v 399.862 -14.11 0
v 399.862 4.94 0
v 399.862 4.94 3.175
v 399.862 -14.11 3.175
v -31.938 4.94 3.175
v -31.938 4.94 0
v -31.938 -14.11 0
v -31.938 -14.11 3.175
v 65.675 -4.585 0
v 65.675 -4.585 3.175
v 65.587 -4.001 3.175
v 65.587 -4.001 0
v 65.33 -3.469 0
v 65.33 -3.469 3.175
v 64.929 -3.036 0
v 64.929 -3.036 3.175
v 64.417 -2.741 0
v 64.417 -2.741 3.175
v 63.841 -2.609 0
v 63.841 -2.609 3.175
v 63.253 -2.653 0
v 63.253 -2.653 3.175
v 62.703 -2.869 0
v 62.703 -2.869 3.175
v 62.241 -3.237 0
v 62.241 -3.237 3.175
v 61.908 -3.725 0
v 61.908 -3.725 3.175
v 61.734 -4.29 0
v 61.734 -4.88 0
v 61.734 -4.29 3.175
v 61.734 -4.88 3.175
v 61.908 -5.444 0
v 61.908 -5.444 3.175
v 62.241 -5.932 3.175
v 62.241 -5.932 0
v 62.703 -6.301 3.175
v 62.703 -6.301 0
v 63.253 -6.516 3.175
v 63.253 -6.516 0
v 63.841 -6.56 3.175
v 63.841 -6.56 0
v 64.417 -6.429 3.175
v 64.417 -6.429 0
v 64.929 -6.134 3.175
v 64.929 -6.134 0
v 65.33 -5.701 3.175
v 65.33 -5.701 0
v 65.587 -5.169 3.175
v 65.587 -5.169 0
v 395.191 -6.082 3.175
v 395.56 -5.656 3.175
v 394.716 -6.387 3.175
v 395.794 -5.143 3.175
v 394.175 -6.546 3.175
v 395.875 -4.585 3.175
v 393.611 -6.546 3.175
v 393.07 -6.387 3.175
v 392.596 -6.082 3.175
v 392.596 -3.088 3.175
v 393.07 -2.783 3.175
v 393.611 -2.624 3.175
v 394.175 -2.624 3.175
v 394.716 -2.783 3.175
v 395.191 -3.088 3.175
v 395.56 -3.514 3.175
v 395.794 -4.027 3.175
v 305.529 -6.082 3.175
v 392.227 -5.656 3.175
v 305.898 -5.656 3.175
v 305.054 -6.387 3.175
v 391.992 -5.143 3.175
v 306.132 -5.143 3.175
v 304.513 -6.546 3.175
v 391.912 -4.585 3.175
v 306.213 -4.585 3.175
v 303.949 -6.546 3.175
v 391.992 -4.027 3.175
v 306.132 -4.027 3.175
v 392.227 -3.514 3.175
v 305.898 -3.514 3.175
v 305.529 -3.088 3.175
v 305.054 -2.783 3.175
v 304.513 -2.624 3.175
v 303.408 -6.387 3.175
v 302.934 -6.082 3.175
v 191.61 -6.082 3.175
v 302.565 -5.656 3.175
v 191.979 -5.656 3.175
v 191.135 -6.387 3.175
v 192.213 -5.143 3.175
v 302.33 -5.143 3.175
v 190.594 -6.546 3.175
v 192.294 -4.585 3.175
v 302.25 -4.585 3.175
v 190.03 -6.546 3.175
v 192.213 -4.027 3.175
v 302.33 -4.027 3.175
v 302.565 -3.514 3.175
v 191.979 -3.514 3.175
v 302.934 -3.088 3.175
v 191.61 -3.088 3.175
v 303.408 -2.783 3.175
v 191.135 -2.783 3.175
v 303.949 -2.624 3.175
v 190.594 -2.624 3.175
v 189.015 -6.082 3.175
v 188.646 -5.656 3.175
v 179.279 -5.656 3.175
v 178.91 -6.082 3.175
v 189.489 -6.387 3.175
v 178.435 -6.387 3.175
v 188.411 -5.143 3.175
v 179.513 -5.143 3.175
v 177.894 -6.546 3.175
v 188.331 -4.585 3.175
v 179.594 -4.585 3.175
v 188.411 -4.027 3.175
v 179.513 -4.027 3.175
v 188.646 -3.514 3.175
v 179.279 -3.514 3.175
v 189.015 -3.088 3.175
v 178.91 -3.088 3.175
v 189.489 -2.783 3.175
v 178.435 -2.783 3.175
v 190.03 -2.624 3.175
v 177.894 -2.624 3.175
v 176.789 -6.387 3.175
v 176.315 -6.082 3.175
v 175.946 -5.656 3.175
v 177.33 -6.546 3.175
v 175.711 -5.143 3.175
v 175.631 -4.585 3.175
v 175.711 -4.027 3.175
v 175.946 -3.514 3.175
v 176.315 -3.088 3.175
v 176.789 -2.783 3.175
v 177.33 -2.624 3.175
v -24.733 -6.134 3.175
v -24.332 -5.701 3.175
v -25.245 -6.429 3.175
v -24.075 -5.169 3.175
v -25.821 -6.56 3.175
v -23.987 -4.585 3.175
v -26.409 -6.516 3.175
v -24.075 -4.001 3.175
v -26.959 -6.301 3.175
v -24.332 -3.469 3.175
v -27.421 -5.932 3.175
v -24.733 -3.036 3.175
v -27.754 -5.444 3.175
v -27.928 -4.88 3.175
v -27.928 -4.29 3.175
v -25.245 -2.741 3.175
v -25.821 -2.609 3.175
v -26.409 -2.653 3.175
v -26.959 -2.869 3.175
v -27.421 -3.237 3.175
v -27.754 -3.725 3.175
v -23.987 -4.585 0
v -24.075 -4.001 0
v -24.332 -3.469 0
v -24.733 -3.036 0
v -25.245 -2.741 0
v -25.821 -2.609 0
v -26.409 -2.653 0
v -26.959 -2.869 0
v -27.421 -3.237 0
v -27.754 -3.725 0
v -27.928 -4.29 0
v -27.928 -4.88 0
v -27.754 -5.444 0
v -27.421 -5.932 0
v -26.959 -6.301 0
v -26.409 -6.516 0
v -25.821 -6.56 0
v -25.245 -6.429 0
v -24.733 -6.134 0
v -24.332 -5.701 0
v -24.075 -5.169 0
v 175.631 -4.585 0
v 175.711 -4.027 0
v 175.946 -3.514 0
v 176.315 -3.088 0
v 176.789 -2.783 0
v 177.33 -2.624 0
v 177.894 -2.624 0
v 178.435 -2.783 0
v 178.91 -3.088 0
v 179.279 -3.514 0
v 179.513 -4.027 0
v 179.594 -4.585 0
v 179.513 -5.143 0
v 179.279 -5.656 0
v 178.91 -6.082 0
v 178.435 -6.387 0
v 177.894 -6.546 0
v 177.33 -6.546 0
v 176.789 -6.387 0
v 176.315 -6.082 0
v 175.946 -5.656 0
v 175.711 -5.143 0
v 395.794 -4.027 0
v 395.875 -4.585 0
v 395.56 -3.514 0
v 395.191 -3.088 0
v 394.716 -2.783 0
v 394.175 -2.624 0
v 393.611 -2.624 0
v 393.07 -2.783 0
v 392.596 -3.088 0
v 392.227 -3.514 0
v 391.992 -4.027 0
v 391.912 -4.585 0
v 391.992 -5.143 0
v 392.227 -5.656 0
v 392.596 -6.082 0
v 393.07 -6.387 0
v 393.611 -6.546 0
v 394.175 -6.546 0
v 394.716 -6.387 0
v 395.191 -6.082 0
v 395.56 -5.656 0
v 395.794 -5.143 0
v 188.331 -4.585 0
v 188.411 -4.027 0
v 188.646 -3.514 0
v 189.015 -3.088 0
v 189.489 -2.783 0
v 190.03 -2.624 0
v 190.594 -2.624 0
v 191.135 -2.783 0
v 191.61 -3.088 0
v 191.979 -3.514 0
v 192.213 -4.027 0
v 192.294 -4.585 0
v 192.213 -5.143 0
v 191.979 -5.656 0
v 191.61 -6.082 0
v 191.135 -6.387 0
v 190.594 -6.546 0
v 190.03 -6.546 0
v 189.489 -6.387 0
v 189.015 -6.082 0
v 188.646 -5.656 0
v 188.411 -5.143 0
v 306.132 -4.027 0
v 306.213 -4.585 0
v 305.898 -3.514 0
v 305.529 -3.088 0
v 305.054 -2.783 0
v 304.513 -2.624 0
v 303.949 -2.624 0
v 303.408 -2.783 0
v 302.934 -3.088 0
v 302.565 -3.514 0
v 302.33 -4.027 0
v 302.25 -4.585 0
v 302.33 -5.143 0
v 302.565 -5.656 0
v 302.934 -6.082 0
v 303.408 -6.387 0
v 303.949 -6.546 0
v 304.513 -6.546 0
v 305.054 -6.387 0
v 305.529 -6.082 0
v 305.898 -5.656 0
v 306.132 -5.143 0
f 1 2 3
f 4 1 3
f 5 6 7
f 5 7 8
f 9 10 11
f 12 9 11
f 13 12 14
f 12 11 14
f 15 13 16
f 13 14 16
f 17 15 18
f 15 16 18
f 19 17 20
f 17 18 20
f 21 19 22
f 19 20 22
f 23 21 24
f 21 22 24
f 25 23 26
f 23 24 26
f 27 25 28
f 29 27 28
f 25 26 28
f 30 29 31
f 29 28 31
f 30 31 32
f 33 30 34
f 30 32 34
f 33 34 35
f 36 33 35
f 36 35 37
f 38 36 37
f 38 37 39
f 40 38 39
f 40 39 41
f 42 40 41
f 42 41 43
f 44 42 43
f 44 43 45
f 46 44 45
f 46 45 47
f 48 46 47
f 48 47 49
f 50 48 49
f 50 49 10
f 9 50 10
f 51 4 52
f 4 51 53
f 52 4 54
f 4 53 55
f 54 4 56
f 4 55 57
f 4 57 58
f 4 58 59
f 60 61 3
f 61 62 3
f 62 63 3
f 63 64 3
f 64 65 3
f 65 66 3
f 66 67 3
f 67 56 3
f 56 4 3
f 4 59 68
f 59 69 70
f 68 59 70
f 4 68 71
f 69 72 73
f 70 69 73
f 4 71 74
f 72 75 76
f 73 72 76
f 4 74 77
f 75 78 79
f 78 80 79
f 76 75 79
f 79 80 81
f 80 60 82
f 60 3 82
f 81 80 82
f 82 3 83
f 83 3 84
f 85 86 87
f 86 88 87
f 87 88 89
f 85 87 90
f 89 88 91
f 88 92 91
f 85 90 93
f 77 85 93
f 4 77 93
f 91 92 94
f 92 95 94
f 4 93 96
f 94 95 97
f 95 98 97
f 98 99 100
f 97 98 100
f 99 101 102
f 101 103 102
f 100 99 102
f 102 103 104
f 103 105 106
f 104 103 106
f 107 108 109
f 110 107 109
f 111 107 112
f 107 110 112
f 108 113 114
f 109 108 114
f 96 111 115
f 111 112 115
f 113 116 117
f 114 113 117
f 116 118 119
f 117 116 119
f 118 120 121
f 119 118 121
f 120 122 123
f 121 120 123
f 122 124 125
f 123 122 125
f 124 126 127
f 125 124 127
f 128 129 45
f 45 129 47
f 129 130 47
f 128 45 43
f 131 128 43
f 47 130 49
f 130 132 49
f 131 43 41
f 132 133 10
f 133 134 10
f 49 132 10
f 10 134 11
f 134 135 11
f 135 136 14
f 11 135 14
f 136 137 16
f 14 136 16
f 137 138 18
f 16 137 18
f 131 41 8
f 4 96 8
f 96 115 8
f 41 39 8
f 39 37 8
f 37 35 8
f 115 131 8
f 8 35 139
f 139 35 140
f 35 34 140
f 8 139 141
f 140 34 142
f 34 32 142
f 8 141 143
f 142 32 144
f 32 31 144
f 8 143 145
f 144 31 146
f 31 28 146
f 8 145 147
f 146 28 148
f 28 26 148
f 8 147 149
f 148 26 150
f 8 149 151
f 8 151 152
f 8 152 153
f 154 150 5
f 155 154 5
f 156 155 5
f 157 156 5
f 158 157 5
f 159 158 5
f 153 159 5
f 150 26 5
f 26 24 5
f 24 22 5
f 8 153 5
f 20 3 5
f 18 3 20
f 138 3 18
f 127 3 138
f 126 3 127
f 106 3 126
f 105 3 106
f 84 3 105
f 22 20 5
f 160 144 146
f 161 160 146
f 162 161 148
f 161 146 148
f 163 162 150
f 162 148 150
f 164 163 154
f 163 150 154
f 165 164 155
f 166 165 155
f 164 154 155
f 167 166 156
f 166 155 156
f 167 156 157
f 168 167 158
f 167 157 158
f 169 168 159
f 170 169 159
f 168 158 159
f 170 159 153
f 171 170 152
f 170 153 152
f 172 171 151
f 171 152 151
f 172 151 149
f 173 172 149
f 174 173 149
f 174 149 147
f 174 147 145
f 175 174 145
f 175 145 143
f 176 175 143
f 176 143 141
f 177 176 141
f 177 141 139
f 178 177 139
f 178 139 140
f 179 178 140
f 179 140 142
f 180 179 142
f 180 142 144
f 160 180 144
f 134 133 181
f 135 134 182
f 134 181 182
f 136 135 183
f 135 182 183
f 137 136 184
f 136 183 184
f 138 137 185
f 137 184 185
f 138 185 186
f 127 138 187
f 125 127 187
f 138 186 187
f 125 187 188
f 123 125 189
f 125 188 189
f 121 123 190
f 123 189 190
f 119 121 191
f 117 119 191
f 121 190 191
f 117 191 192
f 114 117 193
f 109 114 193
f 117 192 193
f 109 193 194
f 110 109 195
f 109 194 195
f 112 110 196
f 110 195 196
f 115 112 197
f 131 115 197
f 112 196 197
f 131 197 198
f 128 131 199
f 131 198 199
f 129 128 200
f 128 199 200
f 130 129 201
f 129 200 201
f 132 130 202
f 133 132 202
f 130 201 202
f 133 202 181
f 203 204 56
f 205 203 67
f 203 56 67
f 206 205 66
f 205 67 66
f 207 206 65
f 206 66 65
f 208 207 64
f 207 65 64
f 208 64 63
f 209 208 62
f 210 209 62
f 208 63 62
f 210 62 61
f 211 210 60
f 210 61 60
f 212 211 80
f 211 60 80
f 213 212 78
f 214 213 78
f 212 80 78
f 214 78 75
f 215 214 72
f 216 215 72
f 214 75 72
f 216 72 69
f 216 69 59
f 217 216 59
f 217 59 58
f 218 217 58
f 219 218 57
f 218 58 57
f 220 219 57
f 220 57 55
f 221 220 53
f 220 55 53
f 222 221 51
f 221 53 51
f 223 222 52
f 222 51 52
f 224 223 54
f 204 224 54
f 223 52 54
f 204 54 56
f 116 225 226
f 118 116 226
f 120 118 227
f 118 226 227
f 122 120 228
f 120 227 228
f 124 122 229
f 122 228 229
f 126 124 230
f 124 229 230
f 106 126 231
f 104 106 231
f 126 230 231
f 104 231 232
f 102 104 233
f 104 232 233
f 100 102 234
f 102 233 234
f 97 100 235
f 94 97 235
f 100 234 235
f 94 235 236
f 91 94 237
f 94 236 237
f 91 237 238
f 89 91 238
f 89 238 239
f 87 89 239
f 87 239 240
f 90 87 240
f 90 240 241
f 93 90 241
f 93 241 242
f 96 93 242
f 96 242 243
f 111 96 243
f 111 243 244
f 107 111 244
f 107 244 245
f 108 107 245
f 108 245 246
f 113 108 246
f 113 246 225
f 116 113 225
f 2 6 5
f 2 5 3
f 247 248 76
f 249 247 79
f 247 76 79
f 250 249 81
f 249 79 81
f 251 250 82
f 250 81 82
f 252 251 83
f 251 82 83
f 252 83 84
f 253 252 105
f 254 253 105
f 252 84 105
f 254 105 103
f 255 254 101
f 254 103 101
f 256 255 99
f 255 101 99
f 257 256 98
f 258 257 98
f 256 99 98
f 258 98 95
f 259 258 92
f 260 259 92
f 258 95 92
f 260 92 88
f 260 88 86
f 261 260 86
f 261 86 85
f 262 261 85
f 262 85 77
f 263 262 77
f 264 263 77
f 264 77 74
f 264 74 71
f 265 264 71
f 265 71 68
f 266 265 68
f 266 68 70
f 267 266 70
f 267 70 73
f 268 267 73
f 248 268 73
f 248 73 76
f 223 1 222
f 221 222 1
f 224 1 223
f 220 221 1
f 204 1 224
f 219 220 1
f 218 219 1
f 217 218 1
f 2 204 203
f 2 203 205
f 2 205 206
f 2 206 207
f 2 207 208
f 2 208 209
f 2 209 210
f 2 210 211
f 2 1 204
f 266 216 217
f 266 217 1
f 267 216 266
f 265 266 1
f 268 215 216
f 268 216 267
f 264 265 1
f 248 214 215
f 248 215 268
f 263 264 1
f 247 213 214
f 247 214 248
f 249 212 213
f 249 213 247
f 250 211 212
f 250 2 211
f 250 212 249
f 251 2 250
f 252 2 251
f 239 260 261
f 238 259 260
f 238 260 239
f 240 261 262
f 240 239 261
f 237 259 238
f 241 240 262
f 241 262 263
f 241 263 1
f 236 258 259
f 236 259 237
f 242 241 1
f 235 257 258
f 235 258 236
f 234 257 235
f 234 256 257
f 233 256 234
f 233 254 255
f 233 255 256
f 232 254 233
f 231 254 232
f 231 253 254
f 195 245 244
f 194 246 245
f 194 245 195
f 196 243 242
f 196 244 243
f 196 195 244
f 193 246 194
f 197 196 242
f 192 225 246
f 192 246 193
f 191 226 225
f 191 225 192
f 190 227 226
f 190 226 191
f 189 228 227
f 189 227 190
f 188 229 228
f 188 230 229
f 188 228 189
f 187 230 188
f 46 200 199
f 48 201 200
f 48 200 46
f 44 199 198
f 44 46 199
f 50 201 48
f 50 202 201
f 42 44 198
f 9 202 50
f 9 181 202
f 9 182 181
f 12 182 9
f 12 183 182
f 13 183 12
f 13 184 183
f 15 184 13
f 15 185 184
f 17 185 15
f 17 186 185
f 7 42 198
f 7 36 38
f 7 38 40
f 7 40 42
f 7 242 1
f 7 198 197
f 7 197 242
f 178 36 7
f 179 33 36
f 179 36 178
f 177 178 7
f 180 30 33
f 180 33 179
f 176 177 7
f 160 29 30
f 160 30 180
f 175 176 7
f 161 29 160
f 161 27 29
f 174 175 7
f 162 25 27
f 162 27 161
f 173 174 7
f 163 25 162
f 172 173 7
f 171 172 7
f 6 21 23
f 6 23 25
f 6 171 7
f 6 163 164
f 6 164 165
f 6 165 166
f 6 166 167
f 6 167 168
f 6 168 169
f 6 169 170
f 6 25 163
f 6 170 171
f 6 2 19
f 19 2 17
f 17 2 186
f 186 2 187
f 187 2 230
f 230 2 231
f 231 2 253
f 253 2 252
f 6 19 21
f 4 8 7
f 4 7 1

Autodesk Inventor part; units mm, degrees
ref_plane "YZ Plane" through (0, 0, 0) normal (1, 0, 0) x (0, 1, 0)
ref_plane "XZ Plane" through (0, 0, 0) normal (0, 1, 0) x (-1, 0, 0)
ref_plane "XY Plane" through (0, 0, 0) normal (0, 0, 1) x (1, 0, 0)
sketch "Sketch1" plane through (0, 0, 0) normal (0, 0, 1) x (1, 0, 0)
  line L0 (-31.9376, 1.7652) -> (399.8624, 1.7652)
  line L1 (399.8624, 1.7652) -> (399.8624, -10.9348)
  line L2 (399.8624, -10.9348) -> (-31.9376, -10.9348)
  line L3 (-31.9376, -10.9348) -> (-31.9376, 1.7652)
  line L4 (183.9624, -4.5848) -> (-26.4766, -4.5848)
  line L5 (-26.4766, -4.5848) -> (394.4014, -4.5848)
  circle A0 centre (-26.4766, -4.5848) radius 1.9812
  circle A1 centre (394.4014, -4.5848) radius 1.9812
  point P0 (0, 0)
  dimension "d0" = 431.8
  dimension "d1" = 12.7
  dimension "d2" = 210.439
  dimension "d3" = 420.878
  dimension "d4" = 3.9624
  dimension "d5" = 3.9624
extrude "Extrusion1" add sketch "Sketch1" along normal blind 3.175
sketch "Sketch2" plane through (-31.9376, 1.7652, 0) normal (0, 1, 0) x (1, 0, 0)
  line L0 (0, -3.175) -> (431.8, -3.175) projected
  line L1 (431.8, 0) -> (431.8, -3.175) projected
  line L2 (0, 0) -> (431.8, 0) projected
  line L3 (0, 0) -> (0, -3.175) projected
  point P0 (31.9376, 0)
extrude "Extrusion2" add sketch "Sketch2" along normal blind 3.175
sketch "Sketch3" plane through (-31.9376, -10.9348, 0) normal (0, -1, 0) x (1, 0, 0)
  line L0 (431.8, 3.175) -> (0, 3.175) projected
  line L1 (0, 0) -> (0, 3.175) projected
  line L2 (431.8, 0) -> (0, 0) projected
  line L3 (431.8, 0) -> (431.8, 3.175) projected
  point P0 (31.9376, 0)
extrude "Extrusion3" add sketch "Sketch3" along normal blind 3.175
sketch "Sketch4" plane through (0, 0, 3.175) normal (0, 0, 1) x (1, 0, 0)
  circle A0 centre (394.4014, -4.5848) radius 1.9812 projected
  circle A1 centre (-26.4766, -4.5848) radius 1.9812 projected
  line L0 (-31.9376, -14.1098) -> (399.8624, -14.1098) projected
  line L1 (394.4014, -4.5848) -> (298.7704, -4.5848)
  line L2 (-26.4766, -4.5848) -> (69.1544, -4.5848)
  circle A2 centre (69.1544, -4.5848) radius 1.9812
  circle A3 centre (298.7704, -4.5848) radius 1.9812
  point P0 (0, 0)
  dimension "d12" = 95.631
  dimension "d13" = 95.631
extrude "Extrusion4" cut sketch "Sketch4" against normal blind 25.4 contours A3 | A2
sketch "Sketch5" plane through (0, 0, 0) normal (0, 0, -1) x (-1, 0, 0)
  circle A0 centre (-298.7704, -4.5848) radius 1.9812 projected
  point P0 (0, 0)
extrude "Extrusion5" add sketch "Sketch5" against normal blind 3.175
sketch "Sketch6" plane through (0, 0, 0) normal (0, 0, -1) x (-1, 0, 0)
  circle A0 centre (-69.1544, -4.5848) radius 1.9812 projected
  point P0 (0, 0)
extrude "Extrusion6" add sketch "Sketch6" against normal blind 3.175
sketch "Sketch7" plane through (0, 0, 0) normal (0, 0, -1) x (-1, 0, 0)
  circle A0 centre (-394.4014, -4.5848) radius 1.9812 projected
  circle A1 centre (26.4766, -4.5848) radius 1.9812 projected
  line L0 (31.9376, 4.9402) -> (-399.8624, 4.9402) projected
  line L1 (26.4766, -4.5848) -> (-63.1854, -4.5848)
  line L2 (-394.4014, -4.5848) -> (-304.7394, -4.5848)
  circle A2 centre (-304.7394, -4.5848) radius 1.9812
  circle A3 centre (-63.1854, -4.5848) radius 1.9812
  point P0 (0, 0)
  dimension "d20" = 89.662
  dimension "d21" = 89.662
extrude "Extrusion7" cut sketch "Sketch7" against normal blind 3.175 contours A2 | A3
sketch "Sketch8" plane through (0, 0, 3.175) normal (0, 0, 1) x (1, 0, 0)
  circle A0 centre (63.1854, -4.5848) radius 1.9812 projected
  circle A1 centre (304.7394, -4.5848) radius 1.9812 projected
  circle A2 centre (394.4014, -4.5848) radius 1.9812 projected
  circle A3 centre (-26.4766, -4.5848) radius 1.9812 projected
  point P0 (0, 0)
extrude "Extrusion8" add sketch "Sketch8" against normal blind 3.175
sketch "Sketch9" plane through (0, 0, 3.175) normal (0, 0, 1) x (1, 0, 0)
  line L0 (-31.9376, -14.1098) -> (399.8624, -14.1098) projected
  line L1 (183.9624, -4.5848) -> (304.2314, -4.5848)
  line L2 (304.2314, -4.5848) -> (63.6934, -4.5848)
  circle A0 centre (304.2314, -4.5848) radius 1.9812
  circle A1 centre (63.6934, -4.5848) radius 1.9812
  line L3 (304.2314, -4.5848) -> (393.8934, -4.5848)
  line L4 (63.6934, -4.5848) -> (-25.9686, -4.5848)
  circle A2 centre (393.8934, -4.5848) radius 1.9812
  circle A3 centre (-25.9686, -4.5848) radius 1.9812
  point P0 (0, 0)
  dimension "d26" = 120.269
  dimension "d27" = 240.538
  dimension "d28" = 3.9624
  dimension "d29" = 89.662
  dimension "d30" = 89.662
extrude "Extrusion9" cut sketch "Sketch9" against normal blind 3.175
sketch "Sketch10" plane through (0, 0, 0) normal (0, 0, -1) x (-1, 0, 0)
  line L0 (31.9376, 4.9402) -> (-399.8624, 4.9402) projected
  line L1 (-183.9624, -4.5848) -> (-177.6124, -4.5848)
  line L2 (-177.6124, -4.5848) -> (-190.3124, -4.5848)
  circle A0 centre (-177.6124, -4.5848) radius 1.9812
  circle A1 centre (-190.3124, -4.5848) radius 1.9812
  point P0 (0, 0)
  dimension "d33" = 6.35
  dimension "d34" = 12.7
extrude "Extrusion10" cut sketch "Sketch10" against normal blind 3.175
properties part number "large"
